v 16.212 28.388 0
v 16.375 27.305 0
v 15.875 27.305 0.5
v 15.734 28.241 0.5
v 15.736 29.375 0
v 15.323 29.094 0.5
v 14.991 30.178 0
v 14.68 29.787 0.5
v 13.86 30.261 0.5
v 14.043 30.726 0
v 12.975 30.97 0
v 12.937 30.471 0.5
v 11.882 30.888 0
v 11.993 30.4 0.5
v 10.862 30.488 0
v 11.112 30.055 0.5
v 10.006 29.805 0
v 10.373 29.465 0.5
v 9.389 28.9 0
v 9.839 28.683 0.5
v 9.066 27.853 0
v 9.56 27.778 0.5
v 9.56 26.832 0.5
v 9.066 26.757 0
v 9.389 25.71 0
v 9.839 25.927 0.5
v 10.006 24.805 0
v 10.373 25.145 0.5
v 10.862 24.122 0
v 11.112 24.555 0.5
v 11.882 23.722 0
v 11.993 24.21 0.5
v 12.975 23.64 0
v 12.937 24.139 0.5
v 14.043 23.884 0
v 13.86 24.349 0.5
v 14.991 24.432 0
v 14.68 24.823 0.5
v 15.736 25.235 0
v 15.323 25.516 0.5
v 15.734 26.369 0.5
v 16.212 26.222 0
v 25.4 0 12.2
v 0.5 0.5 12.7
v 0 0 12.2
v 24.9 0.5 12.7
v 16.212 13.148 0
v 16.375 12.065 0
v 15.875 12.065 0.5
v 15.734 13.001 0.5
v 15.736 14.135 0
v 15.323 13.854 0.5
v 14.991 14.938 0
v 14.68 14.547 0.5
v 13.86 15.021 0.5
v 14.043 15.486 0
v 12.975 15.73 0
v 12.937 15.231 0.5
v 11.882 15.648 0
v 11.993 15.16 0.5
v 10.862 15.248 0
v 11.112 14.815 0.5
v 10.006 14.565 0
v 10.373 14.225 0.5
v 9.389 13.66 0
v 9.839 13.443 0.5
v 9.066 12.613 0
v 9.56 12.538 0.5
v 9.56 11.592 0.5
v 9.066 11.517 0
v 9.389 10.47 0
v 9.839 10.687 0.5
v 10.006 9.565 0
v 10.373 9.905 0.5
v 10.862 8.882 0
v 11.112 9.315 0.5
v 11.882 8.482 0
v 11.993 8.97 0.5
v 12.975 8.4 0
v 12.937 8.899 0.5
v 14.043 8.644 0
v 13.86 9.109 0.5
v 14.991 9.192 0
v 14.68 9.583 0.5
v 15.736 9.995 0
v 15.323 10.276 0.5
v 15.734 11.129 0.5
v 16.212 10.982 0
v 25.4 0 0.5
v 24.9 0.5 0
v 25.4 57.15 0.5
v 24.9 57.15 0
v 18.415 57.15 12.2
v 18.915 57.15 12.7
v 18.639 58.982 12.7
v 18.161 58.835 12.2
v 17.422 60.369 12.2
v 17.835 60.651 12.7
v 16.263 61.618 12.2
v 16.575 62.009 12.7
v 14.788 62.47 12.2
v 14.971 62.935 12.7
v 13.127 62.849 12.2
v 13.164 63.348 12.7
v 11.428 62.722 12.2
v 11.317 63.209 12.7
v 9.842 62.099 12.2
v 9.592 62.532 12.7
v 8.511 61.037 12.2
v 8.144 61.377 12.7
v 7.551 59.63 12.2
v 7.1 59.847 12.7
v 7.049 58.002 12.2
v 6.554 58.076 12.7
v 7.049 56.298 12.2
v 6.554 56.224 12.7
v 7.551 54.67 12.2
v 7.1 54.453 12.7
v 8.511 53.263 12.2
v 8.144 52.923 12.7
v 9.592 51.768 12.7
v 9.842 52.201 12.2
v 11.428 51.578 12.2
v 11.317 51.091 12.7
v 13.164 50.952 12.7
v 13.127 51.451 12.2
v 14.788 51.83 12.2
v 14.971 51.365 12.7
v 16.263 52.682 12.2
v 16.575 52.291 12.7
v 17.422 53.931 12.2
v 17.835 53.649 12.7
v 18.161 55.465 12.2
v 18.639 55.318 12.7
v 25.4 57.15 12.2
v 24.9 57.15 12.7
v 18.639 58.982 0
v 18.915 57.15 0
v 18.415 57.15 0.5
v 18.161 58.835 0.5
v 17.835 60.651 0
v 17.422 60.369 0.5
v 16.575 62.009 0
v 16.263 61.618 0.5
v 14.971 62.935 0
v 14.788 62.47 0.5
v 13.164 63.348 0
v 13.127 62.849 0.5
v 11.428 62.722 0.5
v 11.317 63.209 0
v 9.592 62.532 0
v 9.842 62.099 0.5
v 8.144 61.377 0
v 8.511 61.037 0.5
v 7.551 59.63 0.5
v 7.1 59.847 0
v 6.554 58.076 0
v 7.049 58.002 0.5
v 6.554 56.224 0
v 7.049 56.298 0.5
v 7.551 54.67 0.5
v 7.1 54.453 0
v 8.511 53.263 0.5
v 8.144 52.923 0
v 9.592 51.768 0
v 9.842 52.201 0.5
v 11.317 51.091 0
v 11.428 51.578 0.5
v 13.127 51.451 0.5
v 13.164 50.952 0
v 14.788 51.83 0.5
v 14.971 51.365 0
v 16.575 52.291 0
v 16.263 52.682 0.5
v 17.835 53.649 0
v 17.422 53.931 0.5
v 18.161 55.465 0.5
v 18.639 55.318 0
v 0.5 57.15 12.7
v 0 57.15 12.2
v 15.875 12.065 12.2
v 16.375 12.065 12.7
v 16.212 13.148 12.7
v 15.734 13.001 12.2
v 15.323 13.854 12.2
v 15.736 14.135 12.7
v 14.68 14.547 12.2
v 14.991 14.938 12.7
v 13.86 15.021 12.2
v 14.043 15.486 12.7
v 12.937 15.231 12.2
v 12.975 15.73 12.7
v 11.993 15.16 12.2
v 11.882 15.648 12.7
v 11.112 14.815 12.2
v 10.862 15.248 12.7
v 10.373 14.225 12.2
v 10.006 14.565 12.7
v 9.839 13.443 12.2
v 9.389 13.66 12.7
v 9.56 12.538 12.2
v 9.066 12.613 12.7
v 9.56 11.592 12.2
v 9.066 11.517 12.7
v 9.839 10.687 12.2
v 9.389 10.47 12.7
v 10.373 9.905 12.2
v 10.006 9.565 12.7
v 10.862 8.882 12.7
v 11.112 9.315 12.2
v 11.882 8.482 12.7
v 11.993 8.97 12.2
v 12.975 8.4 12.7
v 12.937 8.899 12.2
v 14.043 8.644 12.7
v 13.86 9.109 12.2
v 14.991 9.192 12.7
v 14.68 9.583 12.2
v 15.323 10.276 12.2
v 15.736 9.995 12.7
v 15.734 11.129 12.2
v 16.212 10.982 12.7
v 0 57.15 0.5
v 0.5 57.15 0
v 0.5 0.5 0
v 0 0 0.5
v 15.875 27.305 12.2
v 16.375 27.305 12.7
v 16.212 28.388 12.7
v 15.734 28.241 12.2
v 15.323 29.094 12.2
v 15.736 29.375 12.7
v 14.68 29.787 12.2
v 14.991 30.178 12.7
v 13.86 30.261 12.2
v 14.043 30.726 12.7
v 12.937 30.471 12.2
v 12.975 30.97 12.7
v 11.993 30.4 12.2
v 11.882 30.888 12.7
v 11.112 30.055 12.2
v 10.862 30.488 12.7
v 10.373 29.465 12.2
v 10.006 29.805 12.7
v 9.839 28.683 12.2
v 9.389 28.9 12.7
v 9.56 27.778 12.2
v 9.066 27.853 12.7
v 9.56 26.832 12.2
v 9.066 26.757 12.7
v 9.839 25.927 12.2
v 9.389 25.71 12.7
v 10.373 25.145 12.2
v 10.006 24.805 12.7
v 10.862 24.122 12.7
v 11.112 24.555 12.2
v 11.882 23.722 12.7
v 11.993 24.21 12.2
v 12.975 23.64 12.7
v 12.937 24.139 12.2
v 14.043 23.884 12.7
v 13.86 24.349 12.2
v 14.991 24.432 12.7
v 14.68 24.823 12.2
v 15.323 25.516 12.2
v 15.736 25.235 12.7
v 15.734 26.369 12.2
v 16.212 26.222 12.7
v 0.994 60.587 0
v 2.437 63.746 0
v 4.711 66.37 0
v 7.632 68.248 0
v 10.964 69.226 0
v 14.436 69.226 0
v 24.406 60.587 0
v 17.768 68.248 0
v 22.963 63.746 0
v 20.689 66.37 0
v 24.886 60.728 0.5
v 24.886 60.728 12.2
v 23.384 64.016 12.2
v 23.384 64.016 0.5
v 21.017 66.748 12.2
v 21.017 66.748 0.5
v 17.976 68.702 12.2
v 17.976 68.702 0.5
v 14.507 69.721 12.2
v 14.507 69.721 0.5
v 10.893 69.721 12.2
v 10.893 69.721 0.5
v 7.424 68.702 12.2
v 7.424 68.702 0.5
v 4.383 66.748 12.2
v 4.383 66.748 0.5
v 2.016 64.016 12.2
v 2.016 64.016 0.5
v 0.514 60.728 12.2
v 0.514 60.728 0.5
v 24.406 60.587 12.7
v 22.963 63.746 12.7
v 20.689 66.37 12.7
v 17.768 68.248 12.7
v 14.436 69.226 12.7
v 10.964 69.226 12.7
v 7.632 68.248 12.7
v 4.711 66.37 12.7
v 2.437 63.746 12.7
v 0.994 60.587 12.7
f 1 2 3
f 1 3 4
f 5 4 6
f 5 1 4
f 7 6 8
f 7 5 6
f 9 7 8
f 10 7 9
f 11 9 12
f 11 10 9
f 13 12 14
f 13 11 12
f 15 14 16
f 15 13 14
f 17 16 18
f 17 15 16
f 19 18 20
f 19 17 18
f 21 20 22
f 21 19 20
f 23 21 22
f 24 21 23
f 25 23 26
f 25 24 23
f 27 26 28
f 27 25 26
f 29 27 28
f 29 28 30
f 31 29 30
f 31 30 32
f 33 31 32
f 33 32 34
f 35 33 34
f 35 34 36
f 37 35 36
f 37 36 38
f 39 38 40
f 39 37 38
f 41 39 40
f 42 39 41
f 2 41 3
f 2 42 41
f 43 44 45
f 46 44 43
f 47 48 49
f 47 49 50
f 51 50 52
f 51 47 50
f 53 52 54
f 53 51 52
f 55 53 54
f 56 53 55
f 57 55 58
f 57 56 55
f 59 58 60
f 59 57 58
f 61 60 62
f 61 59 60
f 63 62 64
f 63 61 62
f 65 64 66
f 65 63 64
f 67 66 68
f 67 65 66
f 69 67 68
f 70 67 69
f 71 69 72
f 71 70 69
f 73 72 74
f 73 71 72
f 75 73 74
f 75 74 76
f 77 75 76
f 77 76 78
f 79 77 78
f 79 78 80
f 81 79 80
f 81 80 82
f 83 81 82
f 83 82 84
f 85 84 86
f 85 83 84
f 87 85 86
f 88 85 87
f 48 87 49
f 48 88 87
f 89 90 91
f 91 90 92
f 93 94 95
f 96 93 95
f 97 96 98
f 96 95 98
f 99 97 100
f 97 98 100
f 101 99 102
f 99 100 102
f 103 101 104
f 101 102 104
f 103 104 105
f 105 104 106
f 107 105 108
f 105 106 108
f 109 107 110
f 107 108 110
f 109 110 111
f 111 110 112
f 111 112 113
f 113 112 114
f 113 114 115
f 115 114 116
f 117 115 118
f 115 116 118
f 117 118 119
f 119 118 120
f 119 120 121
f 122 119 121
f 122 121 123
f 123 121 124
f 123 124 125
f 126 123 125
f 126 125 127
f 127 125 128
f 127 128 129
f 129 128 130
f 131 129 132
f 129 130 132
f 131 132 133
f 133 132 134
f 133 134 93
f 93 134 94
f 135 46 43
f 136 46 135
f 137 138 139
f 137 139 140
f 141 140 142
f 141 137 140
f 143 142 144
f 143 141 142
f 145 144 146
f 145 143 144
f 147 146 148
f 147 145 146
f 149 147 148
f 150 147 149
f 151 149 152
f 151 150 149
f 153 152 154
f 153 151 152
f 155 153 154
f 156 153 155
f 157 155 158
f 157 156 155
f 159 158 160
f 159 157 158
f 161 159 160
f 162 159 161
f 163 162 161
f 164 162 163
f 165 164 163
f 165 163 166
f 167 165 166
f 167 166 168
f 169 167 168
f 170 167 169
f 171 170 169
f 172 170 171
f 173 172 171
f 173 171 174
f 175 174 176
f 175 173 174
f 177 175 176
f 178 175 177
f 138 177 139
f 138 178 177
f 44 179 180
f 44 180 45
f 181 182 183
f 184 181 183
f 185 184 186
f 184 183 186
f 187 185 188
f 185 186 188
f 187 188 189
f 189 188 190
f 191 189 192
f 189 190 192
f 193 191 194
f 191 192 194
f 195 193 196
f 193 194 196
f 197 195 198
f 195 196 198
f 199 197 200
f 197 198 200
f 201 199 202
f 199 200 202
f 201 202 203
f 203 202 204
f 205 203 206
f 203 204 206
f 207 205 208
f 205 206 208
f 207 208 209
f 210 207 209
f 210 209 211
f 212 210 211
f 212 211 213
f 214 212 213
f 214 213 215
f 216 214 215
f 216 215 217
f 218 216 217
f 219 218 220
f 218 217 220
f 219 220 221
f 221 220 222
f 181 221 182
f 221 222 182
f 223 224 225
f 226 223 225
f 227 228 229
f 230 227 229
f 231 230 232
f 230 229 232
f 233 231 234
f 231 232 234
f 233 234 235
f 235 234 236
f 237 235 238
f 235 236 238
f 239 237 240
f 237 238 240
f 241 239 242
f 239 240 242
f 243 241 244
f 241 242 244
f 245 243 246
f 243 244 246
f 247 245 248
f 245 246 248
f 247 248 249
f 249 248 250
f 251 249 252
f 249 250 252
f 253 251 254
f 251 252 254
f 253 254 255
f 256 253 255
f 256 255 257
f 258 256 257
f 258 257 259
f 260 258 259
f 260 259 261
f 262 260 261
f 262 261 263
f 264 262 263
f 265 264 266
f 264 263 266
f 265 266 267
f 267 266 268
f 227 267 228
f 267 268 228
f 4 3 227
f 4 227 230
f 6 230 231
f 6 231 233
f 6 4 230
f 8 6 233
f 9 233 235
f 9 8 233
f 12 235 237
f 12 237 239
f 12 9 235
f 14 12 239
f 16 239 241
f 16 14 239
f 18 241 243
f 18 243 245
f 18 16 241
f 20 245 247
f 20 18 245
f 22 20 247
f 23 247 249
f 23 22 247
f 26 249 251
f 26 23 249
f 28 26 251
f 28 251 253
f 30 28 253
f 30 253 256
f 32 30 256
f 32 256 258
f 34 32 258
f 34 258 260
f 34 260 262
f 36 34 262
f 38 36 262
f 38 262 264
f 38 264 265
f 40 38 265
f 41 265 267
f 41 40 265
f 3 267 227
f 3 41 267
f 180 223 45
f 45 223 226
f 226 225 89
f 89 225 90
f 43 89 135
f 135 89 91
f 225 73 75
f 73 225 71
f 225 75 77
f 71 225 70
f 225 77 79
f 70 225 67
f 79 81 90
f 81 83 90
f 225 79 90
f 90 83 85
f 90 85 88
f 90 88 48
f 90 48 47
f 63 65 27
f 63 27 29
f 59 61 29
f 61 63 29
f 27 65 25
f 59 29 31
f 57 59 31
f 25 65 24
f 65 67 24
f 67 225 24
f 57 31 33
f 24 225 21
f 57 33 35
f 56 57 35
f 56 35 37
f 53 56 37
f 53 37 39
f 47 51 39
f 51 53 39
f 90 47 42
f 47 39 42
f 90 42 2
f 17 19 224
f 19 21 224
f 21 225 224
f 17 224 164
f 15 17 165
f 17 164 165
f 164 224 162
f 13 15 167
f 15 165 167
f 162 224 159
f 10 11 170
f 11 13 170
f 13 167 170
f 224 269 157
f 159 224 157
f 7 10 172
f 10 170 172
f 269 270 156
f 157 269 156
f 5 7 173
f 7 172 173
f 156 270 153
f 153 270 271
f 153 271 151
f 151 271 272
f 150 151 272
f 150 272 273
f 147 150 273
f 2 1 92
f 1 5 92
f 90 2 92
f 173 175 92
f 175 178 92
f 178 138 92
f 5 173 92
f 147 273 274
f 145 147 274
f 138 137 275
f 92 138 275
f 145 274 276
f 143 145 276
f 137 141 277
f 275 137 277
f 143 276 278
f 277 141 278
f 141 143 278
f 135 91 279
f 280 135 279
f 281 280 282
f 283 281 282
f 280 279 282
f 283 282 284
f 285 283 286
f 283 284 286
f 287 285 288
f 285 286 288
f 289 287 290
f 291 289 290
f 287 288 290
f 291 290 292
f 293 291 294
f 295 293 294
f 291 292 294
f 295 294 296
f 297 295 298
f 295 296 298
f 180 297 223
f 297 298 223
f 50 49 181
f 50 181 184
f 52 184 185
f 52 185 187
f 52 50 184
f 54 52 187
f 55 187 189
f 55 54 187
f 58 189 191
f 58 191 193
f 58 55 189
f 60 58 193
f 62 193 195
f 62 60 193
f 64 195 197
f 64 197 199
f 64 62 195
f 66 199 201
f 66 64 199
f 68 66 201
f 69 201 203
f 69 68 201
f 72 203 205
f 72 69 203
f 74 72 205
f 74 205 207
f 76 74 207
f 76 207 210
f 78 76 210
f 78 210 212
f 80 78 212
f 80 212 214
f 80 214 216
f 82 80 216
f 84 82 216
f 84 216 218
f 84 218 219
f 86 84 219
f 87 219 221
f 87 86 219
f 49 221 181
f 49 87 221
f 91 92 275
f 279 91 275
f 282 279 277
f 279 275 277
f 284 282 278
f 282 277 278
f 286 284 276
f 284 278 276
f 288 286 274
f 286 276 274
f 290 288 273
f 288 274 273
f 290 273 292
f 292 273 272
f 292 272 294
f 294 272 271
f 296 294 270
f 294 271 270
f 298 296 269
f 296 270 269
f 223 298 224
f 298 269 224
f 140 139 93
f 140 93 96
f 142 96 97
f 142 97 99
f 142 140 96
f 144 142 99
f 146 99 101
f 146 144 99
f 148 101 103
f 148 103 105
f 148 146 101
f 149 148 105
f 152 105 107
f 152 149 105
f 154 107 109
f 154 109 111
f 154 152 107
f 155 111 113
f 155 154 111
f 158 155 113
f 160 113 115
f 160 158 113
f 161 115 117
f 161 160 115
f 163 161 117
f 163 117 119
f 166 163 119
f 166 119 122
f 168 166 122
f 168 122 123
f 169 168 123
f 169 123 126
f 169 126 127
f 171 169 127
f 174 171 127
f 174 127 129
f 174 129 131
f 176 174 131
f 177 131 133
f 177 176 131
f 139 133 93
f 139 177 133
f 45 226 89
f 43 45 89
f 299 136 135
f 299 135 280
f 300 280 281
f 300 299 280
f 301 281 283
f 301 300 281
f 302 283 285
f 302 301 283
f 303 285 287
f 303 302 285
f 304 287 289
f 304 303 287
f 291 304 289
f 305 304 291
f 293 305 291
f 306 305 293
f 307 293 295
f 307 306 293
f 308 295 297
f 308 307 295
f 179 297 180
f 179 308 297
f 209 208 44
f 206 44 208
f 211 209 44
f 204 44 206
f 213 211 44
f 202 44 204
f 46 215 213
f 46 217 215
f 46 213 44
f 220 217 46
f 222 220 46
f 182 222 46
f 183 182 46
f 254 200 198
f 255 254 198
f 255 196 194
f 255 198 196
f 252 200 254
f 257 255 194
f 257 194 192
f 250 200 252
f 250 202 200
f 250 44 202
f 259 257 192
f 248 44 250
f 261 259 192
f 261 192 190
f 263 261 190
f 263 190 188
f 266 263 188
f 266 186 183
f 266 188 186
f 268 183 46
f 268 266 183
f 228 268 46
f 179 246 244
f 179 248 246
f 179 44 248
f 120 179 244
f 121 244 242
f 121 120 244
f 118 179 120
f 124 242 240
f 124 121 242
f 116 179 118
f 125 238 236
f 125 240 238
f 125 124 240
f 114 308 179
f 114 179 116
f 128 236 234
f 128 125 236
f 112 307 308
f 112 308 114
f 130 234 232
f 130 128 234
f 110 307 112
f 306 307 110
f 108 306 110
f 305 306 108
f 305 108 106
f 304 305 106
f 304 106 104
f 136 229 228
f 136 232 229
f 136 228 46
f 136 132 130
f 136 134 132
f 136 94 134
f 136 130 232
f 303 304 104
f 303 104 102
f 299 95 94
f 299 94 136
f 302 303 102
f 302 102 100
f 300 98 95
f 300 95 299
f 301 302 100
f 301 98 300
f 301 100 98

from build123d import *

# Parameters (mm, degrees)
SKETCH1_R           = 5.715
SKETCH1_R_2         = 3.175
BOSS_EXTRUDE1_DEPTH = 12.7
CHAMFER1_SIZE       = 0.5


with BuildPart() as part:
    # Sketch1 → Boss-Extrude1 (new body)
    with BuildSketch(Plane.XY):
        with BuildLine():
            Line((0, 0), (25.4, 0))
            Line((25.4, 0), (25.4, 40.64))
            Line((25.4, 40.64), (25.4, 57.15))
            ThreePointArc((25.4, 57.15), (12.7, 69.85), (0, 57.15))
            Line((0, 57.15), (0, 40.64))
            Line((0, 40.64), (0, 0))
        make_face()
        with Locations((12.7, 57.15)):
            Circle(SKETCH1_R, mode=Mode.SUBTRACT)
        with Locations((12.7, 27.305)):
            Circle(SKETCH1_R_2, mode=Mode.SUBTRACT)
        with Locations((12.7, 12.065)):
            Circle(SKETCH1_R_2, mode=Mode.SUBTRACT)
    extrude(amount=BOSS_EXTRUDE1_DEPTH)

    # Chamfer1
    chamfer1_edges = [part.edges().sort_by_distance(p)[0] for p in [
        (25.4, 28.575, 12.7),
        (9.525, 27.305, 0),
        (9.525, 27.305, 12.7),
        (12.7, 69.85, 12.7),
        (6.985, 57.15, 0),
        (6.985, 57.15, 12.7),
        (9.525, 12.065, 0),
        (9.525, 12.065, 12.7),
        (0, 28.575, 12.7),
        (0, 28.575, 0),
        (12.7, 69.85, 0),
        (25.4, 28.575, 0),
        (12.7, 0, 0),
        (12.7, 0, 12.7),
    ]]
    chamfer(chamfer1_edges, length=CHAMFER1_SIZE)


solid = part.part
